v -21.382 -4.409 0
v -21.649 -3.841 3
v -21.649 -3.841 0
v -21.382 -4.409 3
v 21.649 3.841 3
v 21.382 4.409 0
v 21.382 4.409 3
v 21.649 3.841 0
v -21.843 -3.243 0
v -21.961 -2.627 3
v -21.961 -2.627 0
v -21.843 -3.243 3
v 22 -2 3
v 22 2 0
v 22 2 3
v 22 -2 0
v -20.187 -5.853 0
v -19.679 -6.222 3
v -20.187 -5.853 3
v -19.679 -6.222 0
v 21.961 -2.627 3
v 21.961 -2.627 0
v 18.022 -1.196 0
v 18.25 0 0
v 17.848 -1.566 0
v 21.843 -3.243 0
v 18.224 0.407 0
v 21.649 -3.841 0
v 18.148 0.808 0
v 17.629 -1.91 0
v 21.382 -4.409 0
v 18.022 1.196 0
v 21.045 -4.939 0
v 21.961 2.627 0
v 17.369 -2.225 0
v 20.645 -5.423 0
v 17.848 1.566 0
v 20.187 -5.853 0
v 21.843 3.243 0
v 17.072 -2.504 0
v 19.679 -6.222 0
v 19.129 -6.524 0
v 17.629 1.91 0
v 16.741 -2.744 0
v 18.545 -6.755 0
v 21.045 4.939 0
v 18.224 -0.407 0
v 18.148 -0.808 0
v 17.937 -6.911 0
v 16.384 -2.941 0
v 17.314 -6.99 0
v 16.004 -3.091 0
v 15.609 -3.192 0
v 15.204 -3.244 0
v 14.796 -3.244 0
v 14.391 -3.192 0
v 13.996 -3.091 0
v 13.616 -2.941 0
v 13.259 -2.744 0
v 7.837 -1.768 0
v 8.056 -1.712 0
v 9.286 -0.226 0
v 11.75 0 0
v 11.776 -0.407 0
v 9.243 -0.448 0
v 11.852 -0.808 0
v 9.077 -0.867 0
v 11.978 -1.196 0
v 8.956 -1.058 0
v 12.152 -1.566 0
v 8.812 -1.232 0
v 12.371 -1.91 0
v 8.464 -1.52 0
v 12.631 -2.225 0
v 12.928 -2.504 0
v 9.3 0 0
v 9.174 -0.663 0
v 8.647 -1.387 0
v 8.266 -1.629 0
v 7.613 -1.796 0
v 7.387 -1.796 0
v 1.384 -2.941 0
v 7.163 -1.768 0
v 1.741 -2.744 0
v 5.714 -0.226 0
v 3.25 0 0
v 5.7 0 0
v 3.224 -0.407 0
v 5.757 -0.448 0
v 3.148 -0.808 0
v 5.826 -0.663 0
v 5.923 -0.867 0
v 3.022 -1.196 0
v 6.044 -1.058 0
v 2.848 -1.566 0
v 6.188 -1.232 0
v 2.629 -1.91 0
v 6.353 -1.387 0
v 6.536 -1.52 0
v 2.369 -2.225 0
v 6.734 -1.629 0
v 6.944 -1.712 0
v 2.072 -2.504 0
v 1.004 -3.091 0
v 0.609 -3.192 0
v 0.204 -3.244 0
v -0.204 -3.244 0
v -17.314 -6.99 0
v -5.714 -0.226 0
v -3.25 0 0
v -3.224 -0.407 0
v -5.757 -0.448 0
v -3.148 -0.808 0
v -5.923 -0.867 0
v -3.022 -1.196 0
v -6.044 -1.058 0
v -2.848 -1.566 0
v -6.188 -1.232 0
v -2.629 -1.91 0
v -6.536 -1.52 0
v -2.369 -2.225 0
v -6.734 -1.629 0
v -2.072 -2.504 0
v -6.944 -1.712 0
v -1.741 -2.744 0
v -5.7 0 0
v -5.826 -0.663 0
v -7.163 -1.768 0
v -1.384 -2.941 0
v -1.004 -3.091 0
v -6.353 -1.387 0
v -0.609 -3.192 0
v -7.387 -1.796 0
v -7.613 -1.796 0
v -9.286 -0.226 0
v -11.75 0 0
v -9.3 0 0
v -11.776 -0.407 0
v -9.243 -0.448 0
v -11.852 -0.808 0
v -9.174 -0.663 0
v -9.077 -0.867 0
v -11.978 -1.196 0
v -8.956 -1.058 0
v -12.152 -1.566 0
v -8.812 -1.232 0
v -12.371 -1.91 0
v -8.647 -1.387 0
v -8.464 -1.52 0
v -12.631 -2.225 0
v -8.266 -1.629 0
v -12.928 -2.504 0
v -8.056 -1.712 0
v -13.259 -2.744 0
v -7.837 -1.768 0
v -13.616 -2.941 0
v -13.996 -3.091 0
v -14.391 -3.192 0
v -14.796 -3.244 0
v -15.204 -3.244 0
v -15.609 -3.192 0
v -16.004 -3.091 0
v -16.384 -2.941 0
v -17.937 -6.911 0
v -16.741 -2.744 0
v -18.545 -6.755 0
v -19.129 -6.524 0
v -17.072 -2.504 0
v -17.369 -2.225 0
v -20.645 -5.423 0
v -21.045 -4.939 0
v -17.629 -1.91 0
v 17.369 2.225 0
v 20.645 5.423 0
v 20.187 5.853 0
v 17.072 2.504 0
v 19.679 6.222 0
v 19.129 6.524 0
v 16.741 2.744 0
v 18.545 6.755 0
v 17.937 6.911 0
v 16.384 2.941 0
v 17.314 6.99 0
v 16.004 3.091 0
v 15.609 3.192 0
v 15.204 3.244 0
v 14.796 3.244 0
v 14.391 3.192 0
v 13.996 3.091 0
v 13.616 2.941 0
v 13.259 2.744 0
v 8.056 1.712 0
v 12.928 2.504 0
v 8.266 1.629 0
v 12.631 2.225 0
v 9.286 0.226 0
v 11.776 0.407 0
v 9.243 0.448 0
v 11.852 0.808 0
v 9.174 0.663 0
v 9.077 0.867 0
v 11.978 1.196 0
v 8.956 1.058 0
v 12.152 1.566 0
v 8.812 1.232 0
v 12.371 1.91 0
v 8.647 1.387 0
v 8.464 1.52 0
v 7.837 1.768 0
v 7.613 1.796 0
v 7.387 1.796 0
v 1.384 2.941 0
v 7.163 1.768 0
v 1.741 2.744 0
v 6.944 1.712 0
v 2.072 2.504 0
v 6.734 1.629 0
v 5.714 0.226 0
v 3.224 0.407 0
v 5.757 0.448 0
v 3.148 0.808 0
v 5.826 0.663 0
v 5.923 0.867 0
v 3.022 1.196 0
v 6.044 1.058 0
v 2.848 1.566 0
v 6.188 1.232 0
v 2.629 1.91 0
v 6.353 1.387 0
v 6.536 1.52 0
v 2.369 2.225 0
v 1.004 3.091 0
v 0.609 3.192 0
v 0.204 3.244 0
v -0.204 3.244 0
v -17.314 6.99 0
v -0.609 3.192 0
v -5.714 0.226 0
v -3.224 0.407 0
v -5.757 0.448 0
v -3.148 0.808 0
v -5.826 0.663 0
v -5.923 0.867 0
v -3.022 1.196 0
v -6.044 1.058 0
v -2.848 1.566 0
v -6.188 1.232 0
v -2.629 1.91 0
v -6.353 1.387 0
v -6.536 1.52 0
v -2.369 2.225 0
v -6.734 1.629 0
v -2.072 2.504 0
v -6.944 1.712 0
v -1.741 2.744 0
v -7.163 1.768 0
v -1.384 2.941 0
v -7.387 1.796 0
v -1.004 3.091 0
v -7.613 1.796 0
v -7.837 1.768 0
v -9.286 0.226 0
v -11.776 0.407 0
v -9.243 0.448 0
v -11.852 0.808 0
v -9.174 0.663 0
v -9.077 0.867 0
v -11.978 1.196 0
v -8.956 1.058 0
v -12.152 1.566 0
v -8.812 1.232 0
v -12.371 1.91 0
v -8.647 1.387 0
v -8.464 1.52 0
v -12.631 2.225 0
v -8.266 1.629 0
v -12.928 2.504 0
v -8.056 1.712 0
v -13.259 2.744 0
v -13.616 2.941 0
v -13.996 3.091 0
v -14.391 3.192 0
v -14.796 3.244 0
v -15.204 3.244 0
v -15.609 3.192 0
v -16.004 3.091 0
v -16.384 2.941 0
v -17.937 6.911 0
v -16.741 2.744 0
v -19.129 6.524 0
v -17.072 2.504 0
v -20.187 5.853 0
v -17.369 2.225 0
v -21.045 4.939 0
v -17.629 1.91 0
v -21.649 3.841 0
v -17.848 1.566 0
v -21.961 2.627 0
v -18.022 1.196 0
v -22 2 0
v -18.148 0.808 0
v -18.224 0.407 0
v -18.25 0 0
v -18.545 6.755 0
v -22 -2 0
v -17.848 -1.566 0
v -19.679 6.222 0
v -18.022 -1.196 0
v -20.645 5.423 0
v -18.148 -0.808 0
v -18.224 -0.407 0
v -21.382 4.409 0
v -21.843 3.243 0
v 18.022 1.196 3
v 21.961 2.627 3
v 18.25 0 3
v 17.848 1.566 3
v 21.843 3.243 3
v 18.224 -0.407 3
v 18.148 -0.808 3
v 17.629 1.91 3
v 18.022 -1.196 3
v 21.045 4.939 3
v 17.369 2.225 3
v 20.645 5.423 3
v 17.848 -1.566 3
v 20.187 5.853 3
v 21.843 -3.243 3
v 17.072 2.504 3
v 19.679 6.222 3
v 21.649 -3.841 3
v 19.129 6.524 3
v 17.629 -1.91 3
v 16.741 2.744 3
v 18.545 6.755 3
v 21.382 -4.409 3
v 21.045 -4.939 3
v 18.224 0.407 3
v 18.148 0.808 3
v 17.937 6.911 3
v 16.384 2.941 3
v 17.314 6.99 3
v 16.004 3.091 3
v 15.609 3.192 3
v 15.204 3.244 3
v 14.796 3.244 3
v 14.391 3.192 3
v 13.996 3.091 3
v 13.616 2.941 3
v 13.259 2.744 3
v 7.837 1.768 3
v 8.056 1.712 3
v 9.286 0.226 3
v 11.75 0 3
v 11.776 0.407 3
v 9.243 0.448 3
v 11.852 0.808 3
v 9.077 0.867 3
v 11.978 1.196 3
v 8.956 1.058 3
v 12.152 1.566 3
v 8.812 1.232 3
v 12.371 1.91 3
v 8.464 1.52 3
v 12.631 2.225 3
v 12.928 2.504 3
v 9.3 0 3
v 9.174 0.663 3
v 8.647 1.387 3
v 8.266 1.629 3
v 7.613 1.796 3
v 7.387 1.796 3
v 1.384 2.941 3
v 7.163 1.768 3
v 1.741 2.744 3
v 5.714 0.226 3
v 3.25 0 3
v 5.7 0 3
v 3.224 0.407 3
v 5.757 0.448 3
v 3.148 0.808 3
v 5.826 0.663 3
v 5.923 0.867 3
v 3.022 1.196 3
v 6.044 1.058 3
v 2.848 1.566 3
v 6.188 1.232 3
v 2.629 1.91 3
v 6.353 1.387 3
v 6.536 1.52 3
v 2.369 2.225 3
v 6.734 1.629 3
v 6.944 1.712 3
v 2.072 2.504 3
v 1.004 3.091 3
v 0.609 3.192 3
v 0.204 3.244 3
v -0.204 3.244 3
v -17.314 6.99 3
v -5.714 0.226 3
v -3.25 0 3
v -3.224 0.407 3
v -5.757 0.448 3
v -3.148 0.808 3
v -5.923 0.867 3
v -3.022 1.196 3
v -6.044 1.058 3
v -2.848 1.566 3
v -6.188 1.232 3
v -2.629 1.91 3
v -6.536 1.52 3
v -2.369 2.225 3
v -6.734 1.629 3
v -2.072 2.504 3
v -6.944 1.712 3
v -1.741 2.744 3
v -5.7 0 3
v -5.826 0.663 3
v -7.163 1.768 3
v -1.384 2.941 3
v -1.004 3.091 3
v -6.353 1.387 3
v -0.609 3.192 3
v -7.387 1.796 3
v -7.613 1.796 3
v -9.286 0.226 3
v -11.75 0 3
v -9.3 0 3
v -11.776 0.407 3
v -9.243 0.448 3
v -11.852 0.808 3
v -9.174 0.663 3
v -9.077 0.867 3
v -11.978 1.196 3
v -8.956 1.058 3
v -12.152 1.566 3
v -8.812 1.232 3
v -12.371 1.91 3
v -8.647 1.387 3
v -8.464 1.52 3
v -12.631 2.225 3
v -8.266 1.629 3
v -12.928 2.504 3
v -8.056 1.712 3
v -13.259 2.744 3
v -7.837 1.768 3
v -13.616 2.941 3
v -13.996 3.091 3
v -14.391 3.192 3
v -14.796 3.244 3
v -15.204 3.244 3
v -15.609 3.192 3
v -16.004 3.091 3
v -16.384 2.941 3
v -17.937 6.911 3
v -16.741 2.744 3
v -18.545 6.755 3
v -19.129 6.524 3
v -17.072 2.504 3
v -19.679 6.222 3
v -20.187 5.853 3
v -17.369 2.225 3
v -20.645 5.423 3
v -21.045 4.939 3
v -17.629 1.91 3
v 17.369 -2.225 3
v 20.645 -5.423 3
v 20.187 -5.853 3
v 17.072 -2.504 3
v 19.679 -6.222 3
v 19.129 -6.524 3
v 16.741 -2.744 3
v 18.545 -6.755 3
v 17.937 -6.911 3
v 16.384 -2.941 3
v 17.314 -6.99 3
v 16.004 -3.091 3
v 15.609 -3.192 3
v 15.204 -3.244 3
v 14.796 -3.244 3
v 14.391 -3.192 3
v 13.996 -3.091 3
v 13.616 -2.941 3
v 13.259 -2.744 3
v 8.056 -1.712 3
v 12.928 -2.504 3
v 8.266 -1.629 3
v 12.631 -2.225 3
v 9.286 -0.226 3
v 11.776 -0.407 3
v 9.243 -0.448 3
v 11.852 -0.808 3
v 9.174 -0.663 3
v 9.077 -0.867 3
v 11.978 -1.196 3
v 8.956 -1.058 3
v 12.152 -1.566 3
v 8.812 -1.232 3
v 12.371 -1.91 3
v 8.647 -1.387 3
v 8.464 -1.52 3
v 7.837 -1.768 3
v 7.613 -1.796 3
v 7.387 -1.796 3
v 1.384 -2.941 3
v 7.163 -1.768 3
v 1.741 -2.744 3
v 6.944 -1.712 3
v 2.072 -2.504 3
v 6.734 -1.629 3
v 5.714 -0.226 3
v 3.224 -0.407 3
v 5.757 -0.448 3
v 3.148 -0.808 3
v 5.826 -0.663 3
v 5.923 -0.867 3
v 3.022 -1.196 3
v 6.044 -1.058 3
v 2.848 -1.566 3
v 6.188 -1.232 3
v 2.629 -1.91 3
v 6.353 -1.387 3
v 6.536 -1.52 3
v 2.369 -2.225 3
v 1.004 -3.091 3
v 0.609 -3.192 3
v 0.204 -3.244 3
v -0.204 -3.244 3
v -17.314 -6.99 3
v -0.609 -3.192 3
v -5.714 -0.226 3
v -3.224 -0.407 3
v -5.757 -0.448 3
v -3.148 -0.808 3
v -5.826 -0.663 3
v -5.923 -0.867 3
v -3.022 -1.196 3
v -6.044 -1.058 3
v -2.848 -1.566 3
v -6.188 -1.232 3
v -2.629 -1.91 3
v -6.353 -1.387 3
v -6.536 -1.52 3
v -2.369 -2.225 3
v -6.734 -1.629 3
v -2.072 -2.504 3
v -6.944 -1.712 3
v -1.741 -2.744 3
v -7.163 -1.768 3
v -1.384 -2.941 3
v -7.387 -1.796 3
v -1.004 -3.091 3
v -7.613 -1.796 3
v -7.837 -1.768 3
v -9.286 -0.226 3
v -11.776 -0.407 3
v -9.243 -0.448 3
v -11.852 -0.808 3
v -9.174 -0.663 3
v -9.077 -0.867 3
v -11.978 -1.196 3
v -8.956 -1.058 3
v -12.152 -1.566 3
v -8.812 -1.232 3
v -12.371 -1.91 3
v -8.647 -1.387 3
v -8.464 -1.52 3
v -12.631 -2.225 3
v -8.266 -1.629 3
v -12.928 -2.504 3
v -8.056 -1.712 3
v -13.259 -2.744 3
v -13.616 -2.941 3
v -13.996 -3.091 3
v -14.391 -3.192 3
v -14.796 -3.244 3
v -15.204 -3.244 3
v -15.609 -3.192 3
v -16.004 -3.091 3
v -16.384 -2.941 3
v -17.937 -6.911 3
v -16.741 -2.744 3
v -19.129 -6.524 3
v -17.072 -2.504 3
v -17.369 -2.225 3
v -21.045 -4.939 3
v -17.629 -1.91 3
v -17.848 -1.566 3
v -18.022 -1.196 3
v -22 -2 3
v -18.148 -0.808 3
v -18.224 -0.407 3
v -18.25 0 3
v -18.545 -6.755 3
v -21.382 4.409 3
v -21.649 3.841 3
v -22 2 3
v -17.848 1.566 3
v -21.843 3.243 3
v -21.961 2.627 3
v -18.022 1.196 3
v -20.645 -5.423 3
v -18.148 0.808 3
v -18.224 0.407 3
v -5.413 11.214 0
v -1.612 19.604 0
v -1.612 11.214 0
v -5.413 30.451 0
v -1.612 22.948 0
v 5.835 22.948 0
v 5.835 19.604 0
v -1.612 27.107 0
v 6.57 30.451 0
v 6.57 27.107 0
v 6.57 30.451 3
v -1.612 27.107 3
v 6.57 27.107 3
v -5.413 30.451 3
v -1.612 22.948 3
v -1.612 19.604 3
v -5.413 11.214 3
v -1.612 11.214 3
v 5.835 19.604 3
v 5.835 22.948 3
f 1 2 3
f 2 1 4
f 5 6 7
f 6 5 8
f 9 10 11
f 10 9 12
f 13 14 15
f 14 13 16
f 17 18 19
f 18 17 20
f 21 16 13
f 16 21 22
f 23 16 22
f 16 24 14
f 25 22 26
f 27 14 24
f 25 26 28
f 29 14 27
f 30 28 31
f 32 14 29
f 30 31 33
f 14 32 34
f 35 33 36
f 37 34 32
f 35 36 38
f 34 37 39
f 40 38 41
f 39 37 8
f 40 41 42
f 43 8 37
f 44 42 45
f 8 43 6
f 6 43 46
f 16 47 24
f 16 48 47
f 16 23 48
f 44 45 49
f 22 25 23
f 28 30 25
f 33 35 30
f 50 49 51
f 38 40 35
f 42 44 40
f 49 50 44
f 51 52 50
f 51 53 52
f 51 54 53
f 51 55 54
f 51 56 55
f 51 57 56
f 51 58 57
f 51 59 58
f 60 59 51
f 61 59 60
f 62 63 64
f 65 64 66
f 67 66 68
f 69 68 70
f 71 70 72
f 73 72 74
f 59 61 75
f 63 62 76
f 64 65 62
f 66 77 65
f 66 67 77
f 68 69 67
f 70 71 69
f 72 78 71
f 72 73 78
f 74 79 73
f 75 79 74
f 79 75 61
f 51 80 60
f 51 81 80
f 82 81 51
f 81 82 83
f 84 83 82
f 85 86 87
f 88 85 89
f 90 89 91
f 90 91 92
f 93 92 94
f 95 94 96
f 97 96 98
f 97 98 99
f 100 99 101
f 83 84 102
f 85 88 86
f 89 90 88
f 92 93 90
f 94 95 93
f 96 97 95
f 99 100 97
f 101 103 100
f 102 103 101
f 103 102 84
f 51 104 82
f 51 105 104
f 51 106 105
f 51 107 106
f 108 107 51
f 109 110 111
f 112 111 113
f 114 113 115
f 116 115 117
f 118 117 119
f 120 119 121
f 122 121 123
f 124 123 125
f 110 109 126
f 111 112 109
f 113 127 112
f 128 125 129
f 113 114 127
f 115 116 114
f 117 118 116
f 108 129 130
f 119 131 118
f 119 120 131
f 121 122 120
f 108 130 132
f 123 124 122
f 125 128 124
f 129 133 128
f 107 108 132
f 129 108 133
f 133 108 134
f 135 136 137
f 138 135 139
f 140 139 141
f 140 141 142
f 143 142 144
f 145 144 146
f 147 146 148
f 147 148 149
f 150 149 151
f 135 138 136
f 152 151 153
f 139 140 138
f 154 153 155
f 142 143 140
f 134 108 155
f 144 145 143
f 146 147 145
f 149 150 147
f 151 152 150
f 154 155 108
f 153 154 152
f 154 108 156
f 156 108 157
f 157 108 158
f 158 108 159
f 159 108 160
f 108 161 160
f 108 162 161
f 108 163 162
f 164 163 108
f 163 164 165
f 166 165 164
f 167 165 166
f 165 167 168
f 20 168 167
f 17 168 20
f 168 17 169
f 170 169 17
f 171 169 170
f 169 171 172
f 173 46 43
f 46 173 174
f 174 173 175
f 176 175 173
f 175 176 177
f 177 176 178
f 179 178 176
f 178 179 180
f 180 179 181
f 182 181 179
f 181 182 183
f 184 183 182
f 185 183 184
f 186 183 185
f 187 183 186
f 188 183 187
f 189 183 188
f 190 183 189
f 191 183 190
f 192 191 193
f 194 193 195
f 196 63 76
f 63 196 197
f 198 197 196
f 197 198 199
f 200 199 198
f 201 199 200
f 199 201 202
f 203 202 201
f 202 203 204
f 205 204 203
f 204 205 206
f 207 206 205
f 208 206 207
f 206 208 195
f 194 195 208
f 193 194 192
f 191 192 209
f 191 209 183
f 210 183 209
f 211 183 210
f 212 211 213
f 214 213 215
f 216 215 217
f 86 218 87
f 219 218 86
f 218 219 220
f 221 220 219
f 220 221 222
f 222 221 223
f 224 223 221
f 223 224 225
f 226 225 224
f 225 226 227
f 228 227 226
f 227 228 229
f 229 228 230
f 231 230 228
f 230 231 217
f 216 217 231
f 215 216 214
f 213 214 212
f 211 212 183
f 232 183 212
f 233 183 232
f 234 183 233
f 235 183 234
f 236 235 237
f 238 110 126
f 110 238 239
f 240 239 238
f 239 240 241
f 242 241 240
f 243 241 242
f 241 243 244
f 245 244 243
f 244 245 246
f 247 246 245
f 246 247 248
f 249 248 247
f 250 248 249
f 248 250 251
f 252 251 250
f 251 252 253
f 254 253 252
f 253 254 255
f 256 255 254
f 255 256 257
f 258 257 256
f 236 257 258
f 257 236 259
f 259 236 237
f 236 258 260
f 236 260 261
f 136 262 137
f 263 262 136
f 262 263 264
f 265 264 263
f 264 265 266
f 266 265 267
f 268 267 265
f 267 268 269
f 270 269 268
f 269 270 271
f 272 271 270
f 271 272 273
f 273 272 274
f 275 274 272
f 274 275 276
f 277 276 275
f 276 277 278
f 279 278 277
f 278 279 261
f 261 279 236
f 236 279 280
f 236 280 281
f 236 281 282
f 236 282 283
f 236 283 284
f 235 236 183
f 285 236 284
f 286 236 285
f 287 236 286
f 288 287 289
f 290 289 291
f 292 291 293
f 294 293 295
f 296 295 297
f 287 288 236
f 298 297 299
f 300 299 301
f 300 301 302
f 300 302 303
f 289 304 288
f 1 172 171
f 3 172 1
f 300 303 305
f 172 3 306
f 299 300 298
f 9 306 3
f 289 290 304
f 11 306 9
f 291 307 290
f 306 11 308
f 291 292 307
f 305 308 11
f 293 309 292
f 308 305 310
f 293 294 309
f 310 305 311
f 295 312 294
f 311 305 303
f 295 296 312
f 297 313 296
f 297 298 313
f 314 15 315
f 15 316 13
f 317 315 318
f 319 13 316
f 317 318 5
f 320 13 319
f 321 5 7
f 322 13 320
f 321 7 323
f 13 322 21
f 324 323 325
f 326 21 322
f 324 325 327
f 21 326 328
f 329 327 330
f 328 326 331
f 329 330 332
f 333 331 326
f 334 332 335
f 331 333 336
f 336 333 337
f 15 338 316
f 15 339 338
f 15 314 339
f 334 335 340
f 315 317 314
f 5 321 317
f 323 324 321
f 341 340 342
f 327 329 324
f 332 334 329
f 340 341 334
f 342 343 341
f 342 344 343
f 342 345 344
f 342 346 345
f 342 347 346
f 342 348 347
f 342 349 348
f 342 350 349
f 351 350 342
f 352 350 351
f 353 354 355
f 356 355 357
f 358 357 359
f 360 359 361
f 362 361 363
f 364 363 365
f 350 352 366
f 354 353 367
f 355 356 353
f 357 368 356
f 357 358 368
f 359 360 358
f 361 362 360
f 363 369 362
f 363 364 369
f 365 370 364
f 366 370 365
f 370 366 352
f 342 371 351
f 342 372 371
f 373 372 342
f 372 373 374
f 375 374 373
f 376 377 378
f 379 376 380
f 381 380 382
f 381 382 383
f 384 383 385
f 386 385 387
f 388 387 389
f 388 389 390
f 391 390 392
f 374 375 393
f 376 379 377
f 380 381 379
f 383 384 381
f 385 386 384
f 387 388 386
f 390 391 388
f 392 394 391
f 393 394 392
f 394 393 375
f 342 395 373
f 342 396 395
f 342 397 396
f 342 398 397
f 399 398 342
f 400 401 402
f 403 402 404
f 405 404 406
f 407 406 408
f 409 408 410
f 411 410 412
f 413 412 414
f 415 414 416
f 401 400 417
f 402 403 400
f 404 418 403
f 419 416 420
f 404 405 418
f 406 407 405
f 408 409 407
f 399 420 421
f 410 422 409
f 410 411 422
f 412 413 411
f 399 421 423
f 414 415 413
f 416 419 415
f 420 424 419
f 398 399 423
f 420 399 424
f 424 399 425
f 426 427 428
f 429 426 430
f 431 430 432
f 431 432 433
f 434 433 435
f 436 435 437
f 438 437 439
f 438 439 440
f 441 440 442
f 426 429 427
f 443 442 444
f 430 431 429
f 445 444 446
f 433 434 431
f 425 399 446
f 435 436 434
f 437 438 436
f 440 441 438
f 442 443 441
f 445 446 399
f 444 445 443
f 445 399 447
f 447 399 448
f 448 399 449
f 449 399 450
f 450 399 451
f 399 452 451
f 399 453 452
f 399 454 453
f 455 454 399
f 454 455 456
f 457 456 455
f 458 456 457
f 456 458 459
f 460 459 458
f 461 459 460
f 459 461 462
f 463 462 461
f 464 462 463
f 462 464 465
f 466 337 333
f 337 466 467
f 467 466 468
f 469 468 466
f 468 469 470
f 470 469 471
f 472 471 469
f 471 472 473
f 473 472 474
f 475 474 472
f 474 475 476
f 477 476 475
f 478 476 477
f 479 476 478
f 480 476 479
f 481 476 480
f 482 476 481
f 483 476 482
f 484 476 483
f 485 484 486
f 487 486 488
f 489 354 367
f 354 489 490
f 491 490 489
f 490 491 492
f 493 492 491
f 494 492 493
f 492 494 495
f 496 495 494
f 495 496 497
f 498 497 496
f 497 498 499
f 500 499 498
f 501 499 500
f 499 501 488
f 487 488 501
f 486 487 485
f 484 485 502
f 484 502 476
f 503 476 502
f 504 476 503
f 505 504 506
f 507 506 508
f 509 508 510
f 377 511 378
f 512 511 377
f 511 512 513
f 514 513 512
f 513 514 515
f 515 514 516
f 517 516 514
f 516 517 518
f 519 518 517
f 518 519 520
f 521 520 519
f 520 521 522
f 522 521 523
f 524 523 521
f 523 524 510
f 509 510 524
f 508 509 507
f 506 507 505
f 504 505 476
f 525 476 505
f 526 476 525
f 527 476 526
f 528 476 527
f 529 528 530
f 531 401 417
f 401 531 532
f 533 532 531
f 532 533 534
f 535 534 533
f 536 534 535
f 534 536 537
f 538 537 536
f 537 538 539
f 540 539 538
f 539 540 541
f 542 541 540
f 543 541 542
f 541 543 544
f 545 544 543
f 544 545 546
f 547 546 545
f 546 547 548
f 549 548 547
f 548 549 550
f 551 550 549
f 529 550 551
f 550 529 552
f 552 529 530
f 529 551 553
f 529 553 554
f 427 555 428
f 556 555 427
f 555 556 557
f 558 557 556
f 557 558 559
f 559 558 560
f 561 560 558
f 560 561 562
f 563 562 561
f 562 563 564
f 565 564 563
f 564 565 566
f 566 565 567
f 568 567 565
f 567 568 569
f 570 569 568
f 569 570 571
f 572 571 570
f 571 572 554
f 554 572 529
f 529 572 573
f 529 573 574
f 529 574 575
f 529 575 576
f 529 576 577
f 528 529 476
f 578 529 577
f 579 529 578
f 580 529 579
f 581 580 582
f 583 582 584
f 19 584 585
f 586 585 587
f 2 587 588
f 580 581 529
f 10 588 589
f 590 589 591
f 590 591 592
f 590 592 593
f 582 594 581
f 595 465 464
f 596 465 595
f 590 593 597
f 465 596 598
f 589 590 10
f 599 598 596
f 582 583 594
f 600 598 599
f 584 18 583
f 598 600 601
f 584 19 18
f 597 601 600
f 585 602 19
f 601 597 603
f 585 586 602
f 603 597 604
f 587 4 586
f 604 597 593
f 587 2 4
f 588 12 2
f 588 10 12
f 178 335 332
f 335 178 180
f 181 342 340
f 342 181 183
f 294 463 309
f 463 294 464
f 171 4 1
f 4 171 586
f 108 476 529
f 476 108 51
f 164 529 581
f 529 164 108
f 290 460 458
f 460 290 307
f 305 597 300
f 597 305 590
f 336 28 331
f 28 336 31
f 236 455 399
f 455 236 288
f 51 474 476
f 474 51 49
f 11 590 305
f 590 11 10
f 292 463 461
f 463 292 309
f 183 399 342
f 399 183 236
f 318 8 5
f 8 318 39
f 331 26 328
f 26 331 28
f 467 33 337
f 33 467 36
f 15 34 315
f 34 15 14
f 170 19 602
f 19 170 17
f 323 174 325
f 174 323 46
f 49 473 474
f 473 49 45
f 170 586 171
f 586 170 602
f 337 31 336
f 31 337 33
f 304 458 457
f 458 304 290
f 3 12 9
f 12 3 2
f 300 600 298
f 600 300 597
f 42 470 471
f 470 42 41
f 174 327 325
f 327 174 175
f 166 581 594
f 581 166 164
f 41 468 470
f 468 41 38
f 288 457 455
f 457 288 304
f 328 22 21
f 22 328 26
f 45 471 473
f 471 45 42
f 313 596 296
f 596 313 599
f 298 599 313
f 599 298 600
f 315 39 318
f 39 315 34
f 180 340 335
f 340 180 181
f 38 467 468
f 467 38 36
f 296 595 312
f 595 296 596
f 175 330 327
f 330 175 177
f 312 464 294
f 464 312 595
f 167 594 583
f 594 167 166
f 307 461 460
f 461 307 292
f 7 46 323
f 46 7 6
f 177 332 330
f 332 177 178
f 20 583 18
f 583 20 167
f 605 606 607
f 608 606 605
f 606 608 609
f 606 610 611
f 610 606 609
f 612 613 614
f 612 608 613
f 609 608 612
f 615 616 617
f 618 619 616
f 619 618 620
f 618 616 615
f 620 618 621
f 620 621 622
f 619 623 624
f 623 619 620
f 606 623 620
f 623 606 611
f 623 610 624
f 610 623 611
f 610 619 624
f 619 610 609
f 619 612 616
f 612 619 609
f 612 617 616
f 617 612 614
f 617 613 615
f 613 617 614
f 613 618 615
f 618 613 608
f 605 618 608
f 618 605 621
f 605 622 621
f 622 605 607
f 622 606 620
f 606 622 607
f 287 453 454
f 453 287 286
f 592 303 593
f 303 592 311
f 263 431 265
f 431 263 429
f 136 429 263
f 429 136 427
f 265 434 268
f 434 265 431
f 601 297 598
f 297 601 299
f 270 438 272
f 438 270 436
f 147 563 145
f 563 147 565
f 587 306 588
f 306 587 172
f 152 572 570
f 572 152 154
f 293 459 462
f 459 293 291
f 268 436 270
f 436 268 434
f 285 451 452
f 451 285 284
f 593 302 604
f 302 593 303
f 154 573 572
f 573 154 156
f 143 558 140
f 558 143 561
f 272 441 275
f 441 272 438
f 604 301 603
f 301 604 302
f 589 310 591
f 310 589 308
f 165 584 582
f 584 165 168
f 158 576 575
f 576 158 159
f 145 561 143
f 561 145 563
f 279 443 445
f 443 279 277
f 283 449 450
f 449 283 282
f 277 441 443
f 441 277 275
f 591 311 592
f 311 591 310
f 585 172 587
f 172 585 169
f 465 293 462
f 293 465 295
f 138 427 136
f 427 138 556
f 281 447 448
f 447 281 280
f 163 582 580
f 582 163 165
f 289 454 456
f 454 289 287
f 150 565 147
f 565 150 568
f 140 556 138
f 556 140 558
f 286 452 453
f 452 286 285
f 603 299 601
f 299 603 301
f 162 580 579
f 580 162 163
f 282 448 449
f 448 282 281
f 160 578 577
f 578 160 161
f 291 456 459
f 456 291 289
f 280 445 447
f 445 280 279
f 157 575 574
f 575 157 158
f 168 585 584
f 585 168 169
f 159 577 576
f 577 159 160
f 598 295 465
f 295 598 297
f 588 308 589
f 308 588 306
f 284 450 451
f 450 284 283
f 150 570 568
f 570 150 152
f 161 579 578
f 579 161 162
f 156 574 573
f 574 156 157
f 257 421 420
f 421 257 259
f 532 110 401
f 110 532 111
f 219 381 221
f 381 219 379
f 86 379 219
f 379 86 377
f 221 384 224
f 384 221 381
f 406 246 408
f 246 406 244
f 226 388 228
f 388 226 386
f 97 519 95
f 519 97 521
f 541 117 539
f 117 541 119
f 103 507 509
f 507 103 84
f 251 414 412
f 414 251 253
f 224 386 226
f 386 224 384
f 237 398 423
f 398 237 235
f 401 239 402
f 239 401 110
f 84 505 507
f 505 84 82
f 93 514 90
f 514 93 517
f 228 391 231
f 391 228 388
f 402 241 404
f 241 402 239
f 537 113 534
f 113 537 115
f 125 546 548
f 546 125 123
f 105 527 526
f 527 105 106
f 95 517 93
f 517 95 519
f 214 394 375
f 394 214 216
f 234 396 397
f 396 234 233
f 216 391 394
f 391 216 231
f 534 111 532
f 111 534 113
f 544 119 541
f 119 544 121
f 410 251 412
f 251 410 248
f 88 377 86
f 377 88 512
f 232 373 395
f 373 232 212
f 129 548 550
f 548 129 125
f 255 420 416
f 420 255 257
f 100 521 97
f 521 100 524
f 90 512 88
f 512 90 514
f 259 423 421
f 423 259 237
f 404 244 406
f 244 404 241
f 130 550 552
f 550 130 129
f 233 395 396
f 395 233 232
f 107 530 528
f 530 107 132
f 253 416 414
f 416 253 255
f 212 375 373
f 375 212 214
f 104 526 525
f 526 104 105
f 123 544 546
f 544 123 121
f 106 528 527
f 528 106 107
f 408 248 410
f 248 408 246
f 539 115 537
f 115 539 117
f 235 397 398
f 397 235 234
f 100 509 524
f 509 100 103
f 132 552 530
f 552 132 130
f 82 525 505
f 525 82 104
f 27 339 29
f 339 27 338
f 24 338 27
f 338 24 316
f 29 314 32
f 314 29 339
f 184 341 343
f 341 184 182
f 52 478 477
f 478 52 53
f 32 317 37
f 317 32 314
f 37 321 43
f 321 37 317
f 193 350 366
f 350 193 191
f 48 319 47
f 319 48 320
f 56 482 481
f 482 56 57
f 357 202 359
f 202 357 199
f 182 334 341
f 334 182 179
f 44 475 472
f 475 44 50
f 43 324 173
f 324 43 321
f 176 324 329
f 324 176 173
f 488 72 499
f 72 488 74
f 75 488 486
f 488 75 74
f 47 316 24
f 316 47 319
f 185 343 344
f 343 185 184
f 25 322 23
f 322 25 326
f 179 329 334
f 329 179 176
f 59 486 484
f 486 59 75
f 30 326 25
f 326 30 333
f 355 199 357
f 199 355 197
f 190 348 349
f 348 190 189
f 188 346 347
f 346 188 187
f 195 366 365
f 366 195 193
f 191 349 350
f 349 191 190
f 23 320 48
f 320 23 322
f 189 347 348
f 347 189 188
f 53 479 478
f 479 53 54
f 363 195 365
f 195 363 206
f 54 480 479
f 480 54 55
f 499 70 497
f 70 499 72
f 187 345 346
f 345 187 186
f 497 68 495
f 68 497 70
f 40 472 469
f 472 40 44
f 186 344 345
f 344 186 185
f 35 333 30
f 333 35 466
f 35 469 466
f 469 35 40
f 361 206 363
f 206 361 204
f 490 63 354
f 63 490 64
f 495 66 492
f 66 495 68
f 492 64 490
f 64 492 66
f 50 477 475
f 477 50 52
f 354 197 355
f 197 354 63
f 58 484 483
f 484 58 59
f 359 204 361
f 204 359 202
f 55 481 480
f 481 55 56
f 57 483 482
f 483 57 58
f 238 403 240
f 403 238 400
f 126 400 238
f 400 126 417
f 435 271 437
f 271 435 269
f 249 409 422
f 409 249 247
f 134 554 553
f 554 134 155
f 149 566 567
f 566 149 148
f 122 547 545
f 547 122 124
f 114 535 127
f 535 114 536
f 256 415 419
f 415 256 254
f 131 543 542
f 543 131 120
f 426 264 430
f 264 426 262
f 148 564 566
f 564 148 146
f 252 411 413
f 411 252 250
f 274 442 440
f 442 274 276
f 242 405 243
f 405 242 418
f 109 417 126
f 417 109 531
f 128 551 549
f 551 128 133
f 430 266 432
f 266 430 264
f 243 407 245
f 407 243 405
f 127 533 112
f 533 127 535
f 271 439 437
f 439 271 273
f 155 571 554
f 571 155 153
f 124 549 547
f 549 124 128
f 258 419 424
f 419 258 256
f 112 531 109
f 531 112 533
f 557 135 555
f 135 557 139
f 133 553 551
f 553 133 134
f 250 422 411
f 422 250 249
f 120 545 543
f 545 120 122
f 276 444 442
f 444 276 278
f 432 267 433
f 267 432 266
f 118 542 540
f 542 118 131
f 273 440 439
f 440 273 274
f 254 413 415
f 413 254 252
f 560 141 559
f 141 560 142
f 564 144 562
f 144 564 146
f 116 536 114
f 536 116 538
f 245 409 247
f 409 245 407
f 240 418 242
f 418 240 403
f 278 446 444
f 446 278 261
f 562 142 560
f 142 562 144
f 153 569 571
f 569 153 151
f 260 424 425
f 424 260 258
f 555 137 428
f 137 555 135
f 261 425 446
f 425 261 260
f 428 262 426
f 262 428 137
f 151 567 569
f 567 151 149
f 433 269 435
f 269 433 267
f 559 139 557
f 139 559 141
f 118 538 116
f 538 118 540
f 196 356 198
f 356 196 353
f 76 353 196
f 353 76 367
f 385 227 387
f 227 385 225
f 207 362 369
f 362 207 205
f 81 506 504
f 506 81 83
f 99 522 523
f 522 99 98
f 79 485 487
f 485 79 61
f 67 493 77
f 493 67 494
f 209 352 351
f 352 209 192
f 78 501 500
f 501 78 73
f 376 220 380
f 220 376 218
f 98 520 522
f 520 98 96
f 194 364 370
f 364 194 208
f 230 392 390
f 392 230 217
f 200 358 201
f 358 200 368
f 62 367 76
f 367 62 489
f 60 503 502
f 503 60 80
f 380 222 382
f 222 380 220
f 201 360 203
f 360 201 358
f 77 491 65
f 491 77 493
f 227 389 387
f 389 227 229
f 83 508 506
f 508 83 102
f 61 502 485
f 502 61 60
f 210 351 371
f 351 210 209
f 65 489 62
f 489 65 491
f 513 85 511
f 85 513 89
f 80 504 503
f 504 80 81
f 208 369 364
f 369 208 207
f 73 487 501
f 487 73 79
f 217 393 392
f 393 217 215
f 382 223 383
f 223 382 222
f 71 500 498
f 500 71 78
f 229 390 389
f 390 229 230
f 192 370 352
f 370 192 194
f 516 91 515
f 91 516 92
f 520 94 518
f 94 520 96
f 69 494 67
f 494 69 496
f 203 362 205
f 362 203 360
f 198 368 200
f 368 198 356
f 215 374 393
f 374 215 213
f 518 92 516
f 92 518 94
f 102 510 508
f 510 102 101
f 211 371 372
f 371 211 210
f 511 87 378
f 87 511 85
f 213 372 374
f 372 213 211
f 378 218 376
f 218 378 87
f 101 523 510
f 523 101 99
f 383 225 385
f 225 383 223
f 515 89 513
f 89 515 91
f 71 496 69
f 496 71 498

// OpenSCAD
$fn = 50;


difference() {
	union() {
		hull() {
			translate(v = [-17.0000000000, 2.0000000000, 0]) {
				cylinder(h = 3, r = 5);
			}
			translate(v = [17.0000000000, 2.0000000000, 0]) {
				cylinder(h = 3, r = 5);
			}
			translate(v = [-17.0000000000, -2.0000000000, 0]) {
				cylinder(h = 3, r = 5);
			}
			translate(v = [17.0000000000, -2.0000000000, 0]) {
				cylinder(h = 3, r = 5);
			}
		}
		translate(v = [0, 30.0000000000, 0]) {
			linear_extrude(height = 3) {
				text(font = "DejaVu Sans Mono:style=Bold", halign = "center", size = 19.0000000000, text = "F", valign = "top");
			}
		}
	}
	union() {
		translate(v = [-15.0000000000, 0.0000000000, 0]) {
			translate(v = [0, 0, -100]) {
				cylinder(h = 200, r = 3.2500000000);
			}
		}
		translate(v = [0, 0, -100]) {
			cylinder(h = 200, r = 3.2500000000);
		}
		translate(v = [15.0000000000, 0.0000000000, 0]) {
			translate(v = [0, 0, -100]) {
				cylinder(h = 200, r = 3.2500000000);
			}
		}
		translate(v = [-15.0000000000, 0.0000000000, 0]) {
			translate(v = [0, 0, -100]) {
				cylinder(h = 200, r = 1.8000000000);
			}
		}
		translate(v = [-7.5000000000, 0.0000000000, 0]) {
			translate(v = [0, 0, -100]) {
				cylinder(h = 200, r = 1.8000000000);
			}
		}
		translate(v = [0, 0, -100]) {
			cylinder(h = 200, r = 1.8000000000);
		}
		translate(v = [7.5000000000, 0.0000000000, 0]) {
			translate(v = [0, 0, -100]) {
				cylinder(h = 200, r = 1.8000000000);
			}
		}
		translate(v = [15.0000000000, 0.0000000000, 0]) {
			translate(v = [0, 0, -100]) {
				cylinder(h = 200, r = 1.8000000000);
			}
		}
	}
}
